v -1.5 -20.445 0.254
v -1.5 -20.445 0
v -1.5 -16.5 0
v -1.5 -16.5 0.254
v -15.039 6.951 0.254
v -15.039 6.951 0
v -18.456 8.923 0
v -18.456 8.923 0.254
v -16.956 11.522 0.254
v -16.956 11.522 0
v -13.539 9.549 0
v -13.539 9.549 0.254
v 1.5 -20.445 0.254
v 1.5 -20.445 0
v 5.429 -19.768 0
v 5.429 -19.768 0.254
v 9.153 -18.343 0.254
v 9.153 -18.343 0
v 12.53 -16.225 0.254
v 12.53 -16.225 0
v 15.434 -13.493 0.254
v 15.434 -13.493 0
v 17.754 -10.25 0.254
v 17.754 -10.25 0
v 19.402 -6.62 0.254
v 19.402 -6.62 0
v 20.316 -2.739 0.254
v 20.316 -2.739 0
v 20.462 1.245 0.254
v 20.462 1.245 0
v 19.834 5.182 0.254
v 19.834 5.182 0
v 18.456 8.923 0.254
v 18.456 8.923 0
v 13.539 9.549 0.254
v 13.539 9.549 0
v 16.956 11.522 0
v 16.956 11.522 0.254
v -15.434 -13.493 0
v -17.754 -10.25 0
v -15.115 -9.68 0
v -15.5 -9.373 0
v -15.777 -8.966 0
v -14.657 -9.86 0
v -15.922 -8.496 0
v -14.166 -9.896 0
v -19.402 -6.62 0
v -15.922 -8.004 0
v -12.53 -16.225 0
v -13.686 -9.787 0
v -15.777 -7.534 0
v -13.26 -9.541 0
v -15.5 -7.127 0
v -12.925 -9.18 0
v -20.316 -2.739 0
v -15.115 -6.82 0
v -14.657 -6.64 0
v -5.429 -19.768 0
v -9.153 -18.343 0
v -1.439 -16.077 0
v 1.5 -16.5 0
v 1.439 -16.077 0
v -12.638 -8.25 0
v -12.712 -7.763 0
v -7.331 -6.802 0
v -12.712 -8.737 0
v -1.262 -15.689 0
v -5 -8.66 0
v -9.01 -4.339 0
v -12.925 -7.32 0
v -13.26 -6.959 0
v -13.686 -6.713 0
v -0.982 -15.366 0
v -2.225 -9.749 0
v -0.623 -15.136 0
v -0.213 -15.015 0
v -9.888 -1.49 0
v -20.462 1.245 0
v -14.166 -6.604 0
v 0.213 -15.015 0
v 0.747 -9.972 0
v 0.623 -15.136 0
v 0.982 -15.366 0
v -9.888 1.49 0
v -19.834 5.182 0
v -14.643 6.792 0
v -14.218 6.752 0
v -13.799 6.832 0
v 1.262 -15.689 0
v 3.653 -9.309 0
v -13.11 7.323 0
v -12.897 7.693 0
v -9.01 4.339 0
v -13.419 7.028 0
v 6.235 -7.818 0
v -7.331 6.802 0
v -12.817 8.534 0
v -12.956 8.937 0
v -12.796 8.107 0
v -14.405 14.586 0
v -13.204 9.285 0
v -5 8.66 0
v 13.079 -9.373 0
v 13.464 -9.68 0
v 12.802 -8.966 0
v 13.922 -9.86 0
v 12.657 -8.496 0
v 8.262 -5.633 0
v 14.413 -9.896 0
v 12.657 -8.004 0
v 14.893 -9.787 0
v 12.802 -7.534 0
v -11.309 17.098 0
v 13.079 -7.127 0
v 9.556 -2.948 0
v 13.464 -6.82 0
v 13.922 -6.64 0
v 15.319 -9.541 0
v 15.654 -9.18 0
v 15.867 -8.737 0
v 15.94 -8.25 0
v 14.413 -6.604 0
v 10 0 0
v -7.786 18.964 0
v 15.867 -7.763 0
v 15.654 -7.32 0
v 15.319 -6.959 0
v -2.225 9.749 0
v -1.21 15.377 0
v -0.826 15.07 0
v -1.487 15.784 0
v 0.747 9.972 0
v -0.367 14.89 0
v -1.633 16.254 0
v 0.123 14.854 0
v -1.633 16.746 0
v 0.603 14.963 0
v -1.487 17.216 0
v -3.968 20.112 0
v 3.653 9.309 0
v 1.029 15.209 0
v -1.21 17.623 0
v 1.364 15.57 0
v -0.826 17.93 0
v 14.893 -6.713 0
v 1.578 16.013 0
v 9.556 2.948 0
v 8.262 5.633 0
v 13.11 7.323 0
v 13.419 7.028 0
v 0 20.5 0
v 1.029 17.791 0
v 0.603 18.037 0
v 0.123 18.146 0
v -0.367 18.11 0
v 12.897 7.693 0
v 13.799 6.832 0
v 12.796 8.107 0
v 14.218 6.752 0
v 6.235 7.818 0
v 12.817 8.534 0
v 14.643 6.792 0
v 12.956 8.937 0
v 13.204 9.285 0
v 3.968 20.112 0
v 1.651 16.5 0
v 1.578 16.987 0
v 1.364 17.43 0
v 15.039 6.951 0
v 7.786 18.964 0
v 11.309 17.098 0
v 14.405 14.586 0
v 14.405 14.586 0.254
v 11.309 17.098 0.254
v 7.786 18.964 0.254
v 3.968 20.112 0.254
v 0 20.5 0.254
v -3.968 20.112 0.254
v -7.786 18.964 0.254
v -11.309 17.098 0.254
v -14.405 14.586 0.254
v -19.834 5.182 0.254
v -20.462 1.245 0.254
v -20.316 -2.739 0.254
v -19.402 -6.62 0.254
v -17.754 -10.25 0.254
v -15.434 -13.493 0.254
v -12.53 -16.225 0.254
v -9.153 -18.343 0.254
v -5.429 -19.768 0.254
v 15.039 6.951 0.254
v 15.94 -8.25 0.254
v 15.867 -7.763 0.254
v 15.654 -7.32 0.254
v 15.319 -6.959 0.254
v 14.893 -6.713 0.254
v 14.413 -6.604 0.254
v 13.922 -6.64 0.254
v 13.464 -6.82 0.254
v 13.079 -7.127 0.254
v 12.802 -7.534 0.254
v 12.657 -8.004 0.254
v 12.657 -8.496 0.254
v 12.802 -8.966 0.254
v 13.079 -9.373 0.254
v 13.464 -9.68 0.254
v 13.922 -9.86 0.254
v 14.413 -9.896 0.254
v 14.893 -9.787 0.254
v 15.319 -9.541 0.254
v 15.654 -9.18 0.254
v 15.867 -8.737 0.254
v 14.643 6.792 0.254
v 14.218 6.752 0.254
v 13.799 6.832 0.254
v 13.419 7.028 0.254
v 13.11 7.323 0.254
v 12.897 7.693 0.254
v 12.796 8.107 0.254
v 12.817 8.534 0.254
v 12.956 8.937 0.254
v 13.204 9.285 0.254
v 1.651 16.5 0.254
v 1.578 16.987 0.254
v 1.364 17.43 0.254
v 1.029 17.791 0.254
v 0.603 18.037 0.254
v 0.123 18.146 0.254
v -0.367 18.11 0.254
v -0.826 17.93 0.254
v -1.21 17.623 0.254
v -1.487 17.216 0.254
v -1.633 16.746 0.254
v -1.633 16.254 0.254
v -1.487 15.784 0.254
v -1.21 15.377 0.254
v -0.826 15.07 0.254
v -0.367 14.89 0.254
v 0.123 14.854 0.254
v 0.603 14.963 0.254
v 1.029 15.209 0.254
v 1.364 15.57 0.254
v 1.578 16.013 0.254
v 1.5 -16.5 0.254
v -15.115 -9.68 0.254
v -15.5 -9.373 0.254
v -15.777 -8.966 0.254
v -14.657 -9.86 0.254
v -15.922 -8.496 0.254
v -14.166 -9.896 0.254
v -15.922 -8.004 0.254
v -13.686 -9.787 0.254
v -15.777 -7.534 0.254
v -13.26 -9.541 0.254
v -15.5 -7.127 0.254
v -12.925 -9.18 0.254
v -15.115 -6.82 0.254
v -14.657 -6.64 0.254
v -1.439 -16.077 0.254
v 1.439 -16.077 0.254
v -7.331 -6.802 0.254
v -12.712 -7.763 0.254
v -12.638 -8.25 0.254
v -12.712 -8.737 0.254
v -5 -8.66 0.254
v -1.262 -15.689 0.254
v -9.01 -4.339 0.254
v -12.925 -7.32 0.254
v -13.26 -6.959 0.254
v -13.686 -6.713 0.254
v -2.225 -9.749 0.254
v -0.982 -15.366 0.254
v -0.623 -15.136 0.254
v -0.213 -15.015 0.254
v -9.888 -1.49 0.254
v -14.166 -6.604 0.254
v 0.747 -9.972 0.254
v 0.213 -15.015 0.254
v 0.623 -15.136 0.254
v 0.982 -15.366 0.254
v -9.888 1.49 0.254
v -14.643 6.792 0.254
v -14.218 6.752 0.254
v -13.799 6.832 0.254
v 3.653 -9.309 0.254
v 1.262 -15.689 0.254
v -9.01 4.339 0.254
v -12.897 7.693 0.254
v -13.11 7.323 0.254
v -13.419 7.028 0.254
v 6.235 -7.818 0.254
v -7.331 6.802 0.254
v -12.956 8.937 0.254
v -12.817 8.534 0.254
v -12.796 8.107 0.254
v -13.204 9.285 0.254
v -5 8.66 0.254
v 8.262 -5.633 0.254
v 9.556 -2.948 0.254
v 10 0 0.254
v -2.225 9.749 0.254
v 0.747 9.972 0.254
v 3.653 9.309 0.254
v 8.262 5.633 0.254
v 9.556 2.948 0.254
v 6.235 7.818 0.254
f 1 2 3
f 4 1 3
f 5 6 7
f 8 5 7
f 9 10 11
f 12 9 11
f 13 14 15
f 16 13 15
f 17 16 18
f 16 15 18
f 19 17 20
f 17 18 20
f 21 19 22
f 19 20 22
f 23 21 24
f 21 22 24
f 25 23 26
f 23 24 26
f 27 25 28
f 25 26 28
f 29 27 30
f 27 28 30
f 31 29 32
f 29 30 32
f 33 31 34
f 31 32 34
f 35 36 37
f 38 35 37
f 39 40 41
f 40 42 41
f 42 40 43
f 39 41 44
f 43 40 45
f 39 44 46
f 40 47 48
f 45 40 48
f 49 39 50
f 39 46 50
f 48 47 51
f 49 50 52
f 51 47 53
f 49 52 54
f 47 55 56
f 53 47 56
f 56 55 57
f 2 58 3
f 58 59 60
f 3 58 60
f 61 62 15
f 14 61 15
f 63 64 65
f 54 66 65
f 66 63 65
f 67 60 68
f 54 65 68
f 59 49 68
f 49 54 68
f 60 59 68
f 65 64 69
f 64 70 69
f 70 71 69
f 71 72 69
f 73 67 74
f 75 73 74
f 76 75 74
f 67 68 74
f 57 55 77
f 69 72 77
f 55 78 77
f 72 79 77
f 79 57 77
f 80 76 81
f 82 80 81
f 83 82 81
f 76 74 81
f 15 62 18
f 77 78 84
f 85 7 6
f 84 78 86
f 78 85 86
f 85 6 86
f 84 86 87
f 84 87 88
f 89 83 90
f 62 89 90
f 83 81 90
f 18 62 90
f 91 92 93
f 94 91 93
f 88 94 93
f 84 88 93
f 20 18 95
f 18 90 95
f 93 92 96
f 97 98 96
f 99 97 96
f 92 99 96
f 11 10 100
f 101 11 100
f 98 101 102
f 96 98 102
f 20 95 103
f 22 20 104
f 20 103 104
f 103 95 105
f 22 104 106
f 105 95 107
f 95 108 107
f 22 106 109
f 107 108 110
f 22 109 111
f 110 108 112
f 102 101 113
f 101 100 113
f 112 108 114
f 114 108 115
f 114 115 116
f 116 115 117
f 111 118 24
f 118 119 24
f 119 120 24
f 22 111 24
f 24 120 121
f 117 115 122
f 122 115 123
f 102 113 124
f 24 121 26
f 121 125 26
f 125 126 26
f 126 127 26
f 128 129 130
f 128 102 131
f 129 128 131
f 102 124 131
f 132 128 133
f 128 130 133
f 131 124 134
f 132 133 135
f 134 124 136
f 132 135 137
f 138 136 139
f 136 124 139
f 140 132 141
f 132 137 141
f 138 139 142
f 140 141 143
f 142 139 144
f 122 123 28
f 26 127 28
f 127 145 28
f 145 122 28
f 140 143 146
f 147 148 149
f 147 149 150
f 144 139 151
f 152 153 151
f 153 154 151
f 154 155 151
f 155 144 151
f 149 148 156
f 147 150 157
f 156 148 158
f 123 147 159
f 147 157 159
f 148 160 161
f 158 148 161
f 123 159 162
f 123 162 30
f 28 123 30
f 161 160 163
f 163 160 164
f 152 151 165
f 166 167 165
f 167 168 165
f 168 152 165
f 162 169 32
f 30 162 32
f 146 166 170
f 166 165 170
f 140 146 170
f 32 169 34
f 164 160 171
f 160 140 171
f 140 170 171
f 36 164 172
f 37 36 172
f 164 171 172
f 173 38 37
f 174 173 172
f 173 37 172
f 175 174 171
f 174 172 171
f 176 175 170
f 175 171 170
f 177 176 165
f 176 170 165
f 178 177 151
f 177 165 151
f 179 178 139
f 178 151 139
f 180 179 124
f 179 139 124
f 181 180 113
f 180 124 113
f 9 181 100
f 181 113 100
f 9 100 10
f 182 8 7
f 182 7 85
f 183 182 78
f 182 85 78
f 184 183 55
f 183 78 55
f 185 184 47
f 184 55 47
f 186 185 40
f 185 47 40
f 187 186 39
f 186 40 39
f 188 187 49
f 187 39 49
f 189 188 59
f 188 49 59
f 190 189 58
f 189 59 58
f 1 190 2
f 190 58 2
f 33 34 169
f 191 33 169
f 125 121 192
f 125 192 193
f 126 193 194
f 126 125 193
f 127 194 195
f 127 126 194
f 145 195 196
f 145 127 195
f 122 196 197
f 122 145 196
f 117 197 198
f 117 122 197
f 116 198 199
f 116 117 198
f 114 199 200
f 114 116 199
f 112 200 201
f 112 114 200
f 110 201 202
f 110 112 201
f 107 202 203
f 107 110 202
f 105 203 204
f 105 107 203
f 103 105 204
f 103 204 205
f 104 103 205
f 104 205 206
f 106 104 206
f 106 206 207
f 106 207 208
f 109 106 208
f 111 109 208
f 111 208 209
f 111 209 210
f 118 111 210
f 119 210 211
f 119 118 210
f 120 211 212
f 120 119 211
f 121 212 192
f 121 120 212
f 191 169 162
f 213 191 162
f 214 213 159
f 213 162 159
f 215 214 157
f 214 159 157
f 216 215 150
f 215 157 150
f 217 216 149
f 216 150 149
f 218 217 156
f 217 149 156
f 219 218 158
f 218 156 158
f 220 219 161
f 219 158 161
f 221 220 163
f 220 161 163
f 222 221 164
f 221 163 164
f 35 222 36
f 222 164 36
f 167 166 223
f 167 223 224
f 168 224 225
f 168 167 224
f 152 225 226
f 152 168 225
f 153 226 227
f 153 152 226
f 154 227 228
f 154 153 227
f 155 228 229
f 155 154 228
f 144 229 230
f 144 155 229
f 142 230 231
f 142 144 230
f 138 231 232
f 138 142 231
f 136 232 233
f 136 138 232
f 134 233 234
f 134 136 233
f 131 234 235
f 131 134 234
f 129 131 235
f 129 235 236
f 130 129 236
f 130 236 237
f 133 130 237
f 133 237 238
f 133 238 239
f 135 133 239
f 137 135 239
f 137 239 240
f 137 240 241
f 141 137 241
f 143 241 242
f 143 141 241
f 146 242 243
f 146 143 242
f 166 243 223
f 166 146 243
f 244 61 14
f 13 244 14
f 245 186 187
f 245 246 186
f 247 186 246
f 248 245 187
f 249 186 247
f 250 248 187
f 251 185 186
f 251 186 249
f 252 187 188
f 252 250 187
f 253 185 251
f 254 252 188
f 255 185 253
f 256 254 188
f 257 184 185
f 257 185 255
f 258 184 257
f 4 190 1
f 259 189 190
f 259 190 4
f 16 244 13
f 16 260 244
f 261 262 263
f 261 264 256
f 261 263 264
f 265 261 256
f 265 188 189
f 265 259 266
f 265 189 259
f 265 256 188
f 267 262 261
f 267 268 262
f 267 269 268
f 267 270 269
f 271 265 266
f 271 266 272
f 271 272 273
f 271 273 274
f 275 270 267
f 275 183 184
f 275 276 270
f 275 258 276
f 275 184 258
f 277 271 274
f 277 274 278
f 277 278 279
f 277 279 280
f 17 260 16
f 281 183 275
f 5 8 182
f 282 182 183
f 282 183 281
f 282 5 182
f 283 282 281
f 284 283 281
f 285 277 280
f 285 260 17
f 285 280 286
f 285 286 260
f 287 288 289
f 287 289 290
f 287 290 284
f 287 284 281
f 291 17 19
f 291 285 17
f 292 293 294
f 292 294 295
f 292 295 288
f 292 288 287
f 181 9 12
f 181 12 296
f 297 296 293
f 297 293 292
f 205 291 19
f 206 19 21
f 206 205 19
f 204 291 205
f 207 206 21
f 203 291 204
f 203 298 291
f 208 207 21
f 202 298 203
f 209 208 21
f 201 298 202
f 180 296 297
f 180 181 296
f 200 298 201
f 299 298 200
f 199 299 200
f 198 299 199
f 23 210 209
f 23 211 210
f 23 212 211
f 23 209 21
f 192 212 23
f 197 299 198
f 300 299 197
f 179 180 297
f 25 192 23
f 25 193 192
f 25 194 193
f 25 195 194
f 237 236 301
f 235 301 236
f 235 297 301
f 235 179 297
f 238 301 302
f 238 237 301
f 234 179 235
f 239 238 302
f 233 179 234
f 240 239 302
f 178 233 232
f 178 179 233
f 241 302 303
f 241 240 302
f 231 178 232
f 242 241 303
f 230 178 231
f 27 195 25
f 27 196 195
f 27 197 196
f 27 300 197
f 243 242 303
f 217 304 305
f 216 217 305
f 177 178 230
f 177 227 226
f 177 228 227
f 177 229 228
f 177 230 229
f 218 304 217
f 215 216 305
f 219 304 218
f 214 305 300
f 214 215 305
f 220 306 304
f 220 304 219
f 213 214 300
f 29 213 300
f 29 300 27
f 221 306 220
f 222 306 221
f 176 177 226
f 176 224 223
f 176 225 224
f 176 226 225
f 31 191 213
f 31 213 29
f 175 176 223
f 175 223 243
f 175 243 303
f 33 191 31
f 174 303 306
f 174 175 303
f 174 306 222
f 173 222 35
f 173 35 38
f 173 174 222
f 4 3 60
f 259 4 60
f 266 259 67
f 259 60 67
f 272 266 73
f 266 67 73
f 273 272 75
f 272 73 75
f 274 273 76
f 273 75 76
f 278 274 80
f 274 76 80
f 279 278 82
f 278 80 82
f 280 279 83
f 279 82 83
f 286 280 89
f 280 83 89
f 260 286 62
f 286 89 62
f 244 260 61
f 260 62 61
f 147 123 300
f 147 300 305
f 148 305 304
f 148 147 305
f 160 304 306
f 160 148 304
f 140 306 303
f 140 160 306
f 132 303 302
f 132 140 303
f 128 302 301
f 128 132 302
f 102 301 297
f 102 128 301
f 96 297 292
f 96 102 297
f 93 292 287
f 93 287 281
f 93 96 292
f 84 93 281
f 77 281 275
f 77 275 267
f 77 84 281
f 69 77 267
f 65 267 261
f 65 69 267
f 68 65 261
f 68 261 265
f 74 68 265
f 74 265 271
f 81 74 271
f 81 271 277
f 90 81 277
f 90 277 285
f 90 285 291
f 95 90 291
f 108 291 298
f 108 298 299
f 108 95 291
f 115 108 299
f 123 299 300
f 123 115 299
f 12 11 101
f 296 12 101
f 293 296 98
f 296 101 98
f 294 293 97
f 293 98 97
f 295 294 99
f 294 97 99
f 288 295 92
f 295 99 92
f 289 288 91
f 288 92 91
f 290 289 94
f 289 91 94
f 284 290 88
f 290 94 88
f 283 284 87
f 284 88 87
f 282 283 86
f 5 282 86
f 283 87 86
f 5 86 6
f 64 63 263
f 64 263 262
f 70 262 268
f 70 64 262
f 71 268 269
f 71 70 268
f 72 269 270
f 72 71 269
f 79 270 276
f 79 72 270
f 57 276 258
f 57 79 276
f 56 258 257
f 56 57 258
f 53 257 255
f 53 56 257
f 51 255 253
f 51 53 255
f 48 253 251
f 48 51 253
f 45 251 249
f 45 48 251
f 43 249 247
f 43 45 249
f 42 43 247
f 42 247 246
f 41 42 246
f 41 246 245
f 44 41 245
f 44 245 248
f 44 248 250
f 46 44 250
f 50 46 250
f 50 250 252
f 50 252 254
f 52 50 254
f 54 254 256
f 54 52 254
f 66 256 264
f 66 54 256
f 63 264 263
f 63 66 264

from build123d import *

# Parameters (mm, degrees)
SKETCH1_R          = 20.5
SKETCH1_R_2        = 10
SKETCH1_R_3        = 1.651
EXTRUDE1_DEPTH     = 0.254
CUT_EXTRUDE1_DEPTH = 29.992490683
CIRPATTERN1_COUNT  = 3


with BuildPart() as part:
    # Sketch1 → Extrude1 (new body)
    with BuildSketch(Plane.XY):
        Circle(SKETCH1_R)
        Circle(SKETCH1_R_2, mode=Mode.SUBTRACT)
        with Locations((0, 16.5)):
            Circle(SKETCH1_R_3, mode=Mode.SUBTRACT)
        with Locations((14.289419162, -8.25)):
            Circle(SKETCH1_R_3, mode=Mode.SUBTRACT)
        with Locations((-14.289419162, -8.25)):
            Circle(SKETCH1_R_3, mode=Mode.SUBTRACT)
    extrude(amount=EXTRUDE1_DEPTH)

    # Sketch4 → Cut-Extrude1 (cut, through all)
    with BuildSketch(Plane(origin=(0, 0, 0), x_dir=(-1, 0, 0), z_dir=(0, 0, -1))):
        with BuildLine():
            ThreePointArc((1.5, -16.5), (0, -15), (-1.5, -16.5))
            Line((-1.5, -16.5), (-1.5, -20.4450483))
            ThreePointArc((-1.5, -20.4450483), (0, -20.5), (1.5, -20.4450483))
            Line((1.5, -20.4450483), (1.5, -16.5))
        make_face()
    cut_extrude1 = extrude(amount=-CUT_EXTRUDE1_DEPTH, mode=Mode.SUBTRACT)

    # CirPattern1: Cut-Extrude1 ×3 about axis
    cirpattern1_axis = Axis((0, 0, 0.254), (0, 0, -1))
    for i in range(1, CIRPATTERN1_COUNT):
        add(cut_extrude1.rotate(cirpattern1_axis, i * 360 / CIRPATTERN1_COUNT), mode=Mode.SUBTRACT)


solid = part.part
